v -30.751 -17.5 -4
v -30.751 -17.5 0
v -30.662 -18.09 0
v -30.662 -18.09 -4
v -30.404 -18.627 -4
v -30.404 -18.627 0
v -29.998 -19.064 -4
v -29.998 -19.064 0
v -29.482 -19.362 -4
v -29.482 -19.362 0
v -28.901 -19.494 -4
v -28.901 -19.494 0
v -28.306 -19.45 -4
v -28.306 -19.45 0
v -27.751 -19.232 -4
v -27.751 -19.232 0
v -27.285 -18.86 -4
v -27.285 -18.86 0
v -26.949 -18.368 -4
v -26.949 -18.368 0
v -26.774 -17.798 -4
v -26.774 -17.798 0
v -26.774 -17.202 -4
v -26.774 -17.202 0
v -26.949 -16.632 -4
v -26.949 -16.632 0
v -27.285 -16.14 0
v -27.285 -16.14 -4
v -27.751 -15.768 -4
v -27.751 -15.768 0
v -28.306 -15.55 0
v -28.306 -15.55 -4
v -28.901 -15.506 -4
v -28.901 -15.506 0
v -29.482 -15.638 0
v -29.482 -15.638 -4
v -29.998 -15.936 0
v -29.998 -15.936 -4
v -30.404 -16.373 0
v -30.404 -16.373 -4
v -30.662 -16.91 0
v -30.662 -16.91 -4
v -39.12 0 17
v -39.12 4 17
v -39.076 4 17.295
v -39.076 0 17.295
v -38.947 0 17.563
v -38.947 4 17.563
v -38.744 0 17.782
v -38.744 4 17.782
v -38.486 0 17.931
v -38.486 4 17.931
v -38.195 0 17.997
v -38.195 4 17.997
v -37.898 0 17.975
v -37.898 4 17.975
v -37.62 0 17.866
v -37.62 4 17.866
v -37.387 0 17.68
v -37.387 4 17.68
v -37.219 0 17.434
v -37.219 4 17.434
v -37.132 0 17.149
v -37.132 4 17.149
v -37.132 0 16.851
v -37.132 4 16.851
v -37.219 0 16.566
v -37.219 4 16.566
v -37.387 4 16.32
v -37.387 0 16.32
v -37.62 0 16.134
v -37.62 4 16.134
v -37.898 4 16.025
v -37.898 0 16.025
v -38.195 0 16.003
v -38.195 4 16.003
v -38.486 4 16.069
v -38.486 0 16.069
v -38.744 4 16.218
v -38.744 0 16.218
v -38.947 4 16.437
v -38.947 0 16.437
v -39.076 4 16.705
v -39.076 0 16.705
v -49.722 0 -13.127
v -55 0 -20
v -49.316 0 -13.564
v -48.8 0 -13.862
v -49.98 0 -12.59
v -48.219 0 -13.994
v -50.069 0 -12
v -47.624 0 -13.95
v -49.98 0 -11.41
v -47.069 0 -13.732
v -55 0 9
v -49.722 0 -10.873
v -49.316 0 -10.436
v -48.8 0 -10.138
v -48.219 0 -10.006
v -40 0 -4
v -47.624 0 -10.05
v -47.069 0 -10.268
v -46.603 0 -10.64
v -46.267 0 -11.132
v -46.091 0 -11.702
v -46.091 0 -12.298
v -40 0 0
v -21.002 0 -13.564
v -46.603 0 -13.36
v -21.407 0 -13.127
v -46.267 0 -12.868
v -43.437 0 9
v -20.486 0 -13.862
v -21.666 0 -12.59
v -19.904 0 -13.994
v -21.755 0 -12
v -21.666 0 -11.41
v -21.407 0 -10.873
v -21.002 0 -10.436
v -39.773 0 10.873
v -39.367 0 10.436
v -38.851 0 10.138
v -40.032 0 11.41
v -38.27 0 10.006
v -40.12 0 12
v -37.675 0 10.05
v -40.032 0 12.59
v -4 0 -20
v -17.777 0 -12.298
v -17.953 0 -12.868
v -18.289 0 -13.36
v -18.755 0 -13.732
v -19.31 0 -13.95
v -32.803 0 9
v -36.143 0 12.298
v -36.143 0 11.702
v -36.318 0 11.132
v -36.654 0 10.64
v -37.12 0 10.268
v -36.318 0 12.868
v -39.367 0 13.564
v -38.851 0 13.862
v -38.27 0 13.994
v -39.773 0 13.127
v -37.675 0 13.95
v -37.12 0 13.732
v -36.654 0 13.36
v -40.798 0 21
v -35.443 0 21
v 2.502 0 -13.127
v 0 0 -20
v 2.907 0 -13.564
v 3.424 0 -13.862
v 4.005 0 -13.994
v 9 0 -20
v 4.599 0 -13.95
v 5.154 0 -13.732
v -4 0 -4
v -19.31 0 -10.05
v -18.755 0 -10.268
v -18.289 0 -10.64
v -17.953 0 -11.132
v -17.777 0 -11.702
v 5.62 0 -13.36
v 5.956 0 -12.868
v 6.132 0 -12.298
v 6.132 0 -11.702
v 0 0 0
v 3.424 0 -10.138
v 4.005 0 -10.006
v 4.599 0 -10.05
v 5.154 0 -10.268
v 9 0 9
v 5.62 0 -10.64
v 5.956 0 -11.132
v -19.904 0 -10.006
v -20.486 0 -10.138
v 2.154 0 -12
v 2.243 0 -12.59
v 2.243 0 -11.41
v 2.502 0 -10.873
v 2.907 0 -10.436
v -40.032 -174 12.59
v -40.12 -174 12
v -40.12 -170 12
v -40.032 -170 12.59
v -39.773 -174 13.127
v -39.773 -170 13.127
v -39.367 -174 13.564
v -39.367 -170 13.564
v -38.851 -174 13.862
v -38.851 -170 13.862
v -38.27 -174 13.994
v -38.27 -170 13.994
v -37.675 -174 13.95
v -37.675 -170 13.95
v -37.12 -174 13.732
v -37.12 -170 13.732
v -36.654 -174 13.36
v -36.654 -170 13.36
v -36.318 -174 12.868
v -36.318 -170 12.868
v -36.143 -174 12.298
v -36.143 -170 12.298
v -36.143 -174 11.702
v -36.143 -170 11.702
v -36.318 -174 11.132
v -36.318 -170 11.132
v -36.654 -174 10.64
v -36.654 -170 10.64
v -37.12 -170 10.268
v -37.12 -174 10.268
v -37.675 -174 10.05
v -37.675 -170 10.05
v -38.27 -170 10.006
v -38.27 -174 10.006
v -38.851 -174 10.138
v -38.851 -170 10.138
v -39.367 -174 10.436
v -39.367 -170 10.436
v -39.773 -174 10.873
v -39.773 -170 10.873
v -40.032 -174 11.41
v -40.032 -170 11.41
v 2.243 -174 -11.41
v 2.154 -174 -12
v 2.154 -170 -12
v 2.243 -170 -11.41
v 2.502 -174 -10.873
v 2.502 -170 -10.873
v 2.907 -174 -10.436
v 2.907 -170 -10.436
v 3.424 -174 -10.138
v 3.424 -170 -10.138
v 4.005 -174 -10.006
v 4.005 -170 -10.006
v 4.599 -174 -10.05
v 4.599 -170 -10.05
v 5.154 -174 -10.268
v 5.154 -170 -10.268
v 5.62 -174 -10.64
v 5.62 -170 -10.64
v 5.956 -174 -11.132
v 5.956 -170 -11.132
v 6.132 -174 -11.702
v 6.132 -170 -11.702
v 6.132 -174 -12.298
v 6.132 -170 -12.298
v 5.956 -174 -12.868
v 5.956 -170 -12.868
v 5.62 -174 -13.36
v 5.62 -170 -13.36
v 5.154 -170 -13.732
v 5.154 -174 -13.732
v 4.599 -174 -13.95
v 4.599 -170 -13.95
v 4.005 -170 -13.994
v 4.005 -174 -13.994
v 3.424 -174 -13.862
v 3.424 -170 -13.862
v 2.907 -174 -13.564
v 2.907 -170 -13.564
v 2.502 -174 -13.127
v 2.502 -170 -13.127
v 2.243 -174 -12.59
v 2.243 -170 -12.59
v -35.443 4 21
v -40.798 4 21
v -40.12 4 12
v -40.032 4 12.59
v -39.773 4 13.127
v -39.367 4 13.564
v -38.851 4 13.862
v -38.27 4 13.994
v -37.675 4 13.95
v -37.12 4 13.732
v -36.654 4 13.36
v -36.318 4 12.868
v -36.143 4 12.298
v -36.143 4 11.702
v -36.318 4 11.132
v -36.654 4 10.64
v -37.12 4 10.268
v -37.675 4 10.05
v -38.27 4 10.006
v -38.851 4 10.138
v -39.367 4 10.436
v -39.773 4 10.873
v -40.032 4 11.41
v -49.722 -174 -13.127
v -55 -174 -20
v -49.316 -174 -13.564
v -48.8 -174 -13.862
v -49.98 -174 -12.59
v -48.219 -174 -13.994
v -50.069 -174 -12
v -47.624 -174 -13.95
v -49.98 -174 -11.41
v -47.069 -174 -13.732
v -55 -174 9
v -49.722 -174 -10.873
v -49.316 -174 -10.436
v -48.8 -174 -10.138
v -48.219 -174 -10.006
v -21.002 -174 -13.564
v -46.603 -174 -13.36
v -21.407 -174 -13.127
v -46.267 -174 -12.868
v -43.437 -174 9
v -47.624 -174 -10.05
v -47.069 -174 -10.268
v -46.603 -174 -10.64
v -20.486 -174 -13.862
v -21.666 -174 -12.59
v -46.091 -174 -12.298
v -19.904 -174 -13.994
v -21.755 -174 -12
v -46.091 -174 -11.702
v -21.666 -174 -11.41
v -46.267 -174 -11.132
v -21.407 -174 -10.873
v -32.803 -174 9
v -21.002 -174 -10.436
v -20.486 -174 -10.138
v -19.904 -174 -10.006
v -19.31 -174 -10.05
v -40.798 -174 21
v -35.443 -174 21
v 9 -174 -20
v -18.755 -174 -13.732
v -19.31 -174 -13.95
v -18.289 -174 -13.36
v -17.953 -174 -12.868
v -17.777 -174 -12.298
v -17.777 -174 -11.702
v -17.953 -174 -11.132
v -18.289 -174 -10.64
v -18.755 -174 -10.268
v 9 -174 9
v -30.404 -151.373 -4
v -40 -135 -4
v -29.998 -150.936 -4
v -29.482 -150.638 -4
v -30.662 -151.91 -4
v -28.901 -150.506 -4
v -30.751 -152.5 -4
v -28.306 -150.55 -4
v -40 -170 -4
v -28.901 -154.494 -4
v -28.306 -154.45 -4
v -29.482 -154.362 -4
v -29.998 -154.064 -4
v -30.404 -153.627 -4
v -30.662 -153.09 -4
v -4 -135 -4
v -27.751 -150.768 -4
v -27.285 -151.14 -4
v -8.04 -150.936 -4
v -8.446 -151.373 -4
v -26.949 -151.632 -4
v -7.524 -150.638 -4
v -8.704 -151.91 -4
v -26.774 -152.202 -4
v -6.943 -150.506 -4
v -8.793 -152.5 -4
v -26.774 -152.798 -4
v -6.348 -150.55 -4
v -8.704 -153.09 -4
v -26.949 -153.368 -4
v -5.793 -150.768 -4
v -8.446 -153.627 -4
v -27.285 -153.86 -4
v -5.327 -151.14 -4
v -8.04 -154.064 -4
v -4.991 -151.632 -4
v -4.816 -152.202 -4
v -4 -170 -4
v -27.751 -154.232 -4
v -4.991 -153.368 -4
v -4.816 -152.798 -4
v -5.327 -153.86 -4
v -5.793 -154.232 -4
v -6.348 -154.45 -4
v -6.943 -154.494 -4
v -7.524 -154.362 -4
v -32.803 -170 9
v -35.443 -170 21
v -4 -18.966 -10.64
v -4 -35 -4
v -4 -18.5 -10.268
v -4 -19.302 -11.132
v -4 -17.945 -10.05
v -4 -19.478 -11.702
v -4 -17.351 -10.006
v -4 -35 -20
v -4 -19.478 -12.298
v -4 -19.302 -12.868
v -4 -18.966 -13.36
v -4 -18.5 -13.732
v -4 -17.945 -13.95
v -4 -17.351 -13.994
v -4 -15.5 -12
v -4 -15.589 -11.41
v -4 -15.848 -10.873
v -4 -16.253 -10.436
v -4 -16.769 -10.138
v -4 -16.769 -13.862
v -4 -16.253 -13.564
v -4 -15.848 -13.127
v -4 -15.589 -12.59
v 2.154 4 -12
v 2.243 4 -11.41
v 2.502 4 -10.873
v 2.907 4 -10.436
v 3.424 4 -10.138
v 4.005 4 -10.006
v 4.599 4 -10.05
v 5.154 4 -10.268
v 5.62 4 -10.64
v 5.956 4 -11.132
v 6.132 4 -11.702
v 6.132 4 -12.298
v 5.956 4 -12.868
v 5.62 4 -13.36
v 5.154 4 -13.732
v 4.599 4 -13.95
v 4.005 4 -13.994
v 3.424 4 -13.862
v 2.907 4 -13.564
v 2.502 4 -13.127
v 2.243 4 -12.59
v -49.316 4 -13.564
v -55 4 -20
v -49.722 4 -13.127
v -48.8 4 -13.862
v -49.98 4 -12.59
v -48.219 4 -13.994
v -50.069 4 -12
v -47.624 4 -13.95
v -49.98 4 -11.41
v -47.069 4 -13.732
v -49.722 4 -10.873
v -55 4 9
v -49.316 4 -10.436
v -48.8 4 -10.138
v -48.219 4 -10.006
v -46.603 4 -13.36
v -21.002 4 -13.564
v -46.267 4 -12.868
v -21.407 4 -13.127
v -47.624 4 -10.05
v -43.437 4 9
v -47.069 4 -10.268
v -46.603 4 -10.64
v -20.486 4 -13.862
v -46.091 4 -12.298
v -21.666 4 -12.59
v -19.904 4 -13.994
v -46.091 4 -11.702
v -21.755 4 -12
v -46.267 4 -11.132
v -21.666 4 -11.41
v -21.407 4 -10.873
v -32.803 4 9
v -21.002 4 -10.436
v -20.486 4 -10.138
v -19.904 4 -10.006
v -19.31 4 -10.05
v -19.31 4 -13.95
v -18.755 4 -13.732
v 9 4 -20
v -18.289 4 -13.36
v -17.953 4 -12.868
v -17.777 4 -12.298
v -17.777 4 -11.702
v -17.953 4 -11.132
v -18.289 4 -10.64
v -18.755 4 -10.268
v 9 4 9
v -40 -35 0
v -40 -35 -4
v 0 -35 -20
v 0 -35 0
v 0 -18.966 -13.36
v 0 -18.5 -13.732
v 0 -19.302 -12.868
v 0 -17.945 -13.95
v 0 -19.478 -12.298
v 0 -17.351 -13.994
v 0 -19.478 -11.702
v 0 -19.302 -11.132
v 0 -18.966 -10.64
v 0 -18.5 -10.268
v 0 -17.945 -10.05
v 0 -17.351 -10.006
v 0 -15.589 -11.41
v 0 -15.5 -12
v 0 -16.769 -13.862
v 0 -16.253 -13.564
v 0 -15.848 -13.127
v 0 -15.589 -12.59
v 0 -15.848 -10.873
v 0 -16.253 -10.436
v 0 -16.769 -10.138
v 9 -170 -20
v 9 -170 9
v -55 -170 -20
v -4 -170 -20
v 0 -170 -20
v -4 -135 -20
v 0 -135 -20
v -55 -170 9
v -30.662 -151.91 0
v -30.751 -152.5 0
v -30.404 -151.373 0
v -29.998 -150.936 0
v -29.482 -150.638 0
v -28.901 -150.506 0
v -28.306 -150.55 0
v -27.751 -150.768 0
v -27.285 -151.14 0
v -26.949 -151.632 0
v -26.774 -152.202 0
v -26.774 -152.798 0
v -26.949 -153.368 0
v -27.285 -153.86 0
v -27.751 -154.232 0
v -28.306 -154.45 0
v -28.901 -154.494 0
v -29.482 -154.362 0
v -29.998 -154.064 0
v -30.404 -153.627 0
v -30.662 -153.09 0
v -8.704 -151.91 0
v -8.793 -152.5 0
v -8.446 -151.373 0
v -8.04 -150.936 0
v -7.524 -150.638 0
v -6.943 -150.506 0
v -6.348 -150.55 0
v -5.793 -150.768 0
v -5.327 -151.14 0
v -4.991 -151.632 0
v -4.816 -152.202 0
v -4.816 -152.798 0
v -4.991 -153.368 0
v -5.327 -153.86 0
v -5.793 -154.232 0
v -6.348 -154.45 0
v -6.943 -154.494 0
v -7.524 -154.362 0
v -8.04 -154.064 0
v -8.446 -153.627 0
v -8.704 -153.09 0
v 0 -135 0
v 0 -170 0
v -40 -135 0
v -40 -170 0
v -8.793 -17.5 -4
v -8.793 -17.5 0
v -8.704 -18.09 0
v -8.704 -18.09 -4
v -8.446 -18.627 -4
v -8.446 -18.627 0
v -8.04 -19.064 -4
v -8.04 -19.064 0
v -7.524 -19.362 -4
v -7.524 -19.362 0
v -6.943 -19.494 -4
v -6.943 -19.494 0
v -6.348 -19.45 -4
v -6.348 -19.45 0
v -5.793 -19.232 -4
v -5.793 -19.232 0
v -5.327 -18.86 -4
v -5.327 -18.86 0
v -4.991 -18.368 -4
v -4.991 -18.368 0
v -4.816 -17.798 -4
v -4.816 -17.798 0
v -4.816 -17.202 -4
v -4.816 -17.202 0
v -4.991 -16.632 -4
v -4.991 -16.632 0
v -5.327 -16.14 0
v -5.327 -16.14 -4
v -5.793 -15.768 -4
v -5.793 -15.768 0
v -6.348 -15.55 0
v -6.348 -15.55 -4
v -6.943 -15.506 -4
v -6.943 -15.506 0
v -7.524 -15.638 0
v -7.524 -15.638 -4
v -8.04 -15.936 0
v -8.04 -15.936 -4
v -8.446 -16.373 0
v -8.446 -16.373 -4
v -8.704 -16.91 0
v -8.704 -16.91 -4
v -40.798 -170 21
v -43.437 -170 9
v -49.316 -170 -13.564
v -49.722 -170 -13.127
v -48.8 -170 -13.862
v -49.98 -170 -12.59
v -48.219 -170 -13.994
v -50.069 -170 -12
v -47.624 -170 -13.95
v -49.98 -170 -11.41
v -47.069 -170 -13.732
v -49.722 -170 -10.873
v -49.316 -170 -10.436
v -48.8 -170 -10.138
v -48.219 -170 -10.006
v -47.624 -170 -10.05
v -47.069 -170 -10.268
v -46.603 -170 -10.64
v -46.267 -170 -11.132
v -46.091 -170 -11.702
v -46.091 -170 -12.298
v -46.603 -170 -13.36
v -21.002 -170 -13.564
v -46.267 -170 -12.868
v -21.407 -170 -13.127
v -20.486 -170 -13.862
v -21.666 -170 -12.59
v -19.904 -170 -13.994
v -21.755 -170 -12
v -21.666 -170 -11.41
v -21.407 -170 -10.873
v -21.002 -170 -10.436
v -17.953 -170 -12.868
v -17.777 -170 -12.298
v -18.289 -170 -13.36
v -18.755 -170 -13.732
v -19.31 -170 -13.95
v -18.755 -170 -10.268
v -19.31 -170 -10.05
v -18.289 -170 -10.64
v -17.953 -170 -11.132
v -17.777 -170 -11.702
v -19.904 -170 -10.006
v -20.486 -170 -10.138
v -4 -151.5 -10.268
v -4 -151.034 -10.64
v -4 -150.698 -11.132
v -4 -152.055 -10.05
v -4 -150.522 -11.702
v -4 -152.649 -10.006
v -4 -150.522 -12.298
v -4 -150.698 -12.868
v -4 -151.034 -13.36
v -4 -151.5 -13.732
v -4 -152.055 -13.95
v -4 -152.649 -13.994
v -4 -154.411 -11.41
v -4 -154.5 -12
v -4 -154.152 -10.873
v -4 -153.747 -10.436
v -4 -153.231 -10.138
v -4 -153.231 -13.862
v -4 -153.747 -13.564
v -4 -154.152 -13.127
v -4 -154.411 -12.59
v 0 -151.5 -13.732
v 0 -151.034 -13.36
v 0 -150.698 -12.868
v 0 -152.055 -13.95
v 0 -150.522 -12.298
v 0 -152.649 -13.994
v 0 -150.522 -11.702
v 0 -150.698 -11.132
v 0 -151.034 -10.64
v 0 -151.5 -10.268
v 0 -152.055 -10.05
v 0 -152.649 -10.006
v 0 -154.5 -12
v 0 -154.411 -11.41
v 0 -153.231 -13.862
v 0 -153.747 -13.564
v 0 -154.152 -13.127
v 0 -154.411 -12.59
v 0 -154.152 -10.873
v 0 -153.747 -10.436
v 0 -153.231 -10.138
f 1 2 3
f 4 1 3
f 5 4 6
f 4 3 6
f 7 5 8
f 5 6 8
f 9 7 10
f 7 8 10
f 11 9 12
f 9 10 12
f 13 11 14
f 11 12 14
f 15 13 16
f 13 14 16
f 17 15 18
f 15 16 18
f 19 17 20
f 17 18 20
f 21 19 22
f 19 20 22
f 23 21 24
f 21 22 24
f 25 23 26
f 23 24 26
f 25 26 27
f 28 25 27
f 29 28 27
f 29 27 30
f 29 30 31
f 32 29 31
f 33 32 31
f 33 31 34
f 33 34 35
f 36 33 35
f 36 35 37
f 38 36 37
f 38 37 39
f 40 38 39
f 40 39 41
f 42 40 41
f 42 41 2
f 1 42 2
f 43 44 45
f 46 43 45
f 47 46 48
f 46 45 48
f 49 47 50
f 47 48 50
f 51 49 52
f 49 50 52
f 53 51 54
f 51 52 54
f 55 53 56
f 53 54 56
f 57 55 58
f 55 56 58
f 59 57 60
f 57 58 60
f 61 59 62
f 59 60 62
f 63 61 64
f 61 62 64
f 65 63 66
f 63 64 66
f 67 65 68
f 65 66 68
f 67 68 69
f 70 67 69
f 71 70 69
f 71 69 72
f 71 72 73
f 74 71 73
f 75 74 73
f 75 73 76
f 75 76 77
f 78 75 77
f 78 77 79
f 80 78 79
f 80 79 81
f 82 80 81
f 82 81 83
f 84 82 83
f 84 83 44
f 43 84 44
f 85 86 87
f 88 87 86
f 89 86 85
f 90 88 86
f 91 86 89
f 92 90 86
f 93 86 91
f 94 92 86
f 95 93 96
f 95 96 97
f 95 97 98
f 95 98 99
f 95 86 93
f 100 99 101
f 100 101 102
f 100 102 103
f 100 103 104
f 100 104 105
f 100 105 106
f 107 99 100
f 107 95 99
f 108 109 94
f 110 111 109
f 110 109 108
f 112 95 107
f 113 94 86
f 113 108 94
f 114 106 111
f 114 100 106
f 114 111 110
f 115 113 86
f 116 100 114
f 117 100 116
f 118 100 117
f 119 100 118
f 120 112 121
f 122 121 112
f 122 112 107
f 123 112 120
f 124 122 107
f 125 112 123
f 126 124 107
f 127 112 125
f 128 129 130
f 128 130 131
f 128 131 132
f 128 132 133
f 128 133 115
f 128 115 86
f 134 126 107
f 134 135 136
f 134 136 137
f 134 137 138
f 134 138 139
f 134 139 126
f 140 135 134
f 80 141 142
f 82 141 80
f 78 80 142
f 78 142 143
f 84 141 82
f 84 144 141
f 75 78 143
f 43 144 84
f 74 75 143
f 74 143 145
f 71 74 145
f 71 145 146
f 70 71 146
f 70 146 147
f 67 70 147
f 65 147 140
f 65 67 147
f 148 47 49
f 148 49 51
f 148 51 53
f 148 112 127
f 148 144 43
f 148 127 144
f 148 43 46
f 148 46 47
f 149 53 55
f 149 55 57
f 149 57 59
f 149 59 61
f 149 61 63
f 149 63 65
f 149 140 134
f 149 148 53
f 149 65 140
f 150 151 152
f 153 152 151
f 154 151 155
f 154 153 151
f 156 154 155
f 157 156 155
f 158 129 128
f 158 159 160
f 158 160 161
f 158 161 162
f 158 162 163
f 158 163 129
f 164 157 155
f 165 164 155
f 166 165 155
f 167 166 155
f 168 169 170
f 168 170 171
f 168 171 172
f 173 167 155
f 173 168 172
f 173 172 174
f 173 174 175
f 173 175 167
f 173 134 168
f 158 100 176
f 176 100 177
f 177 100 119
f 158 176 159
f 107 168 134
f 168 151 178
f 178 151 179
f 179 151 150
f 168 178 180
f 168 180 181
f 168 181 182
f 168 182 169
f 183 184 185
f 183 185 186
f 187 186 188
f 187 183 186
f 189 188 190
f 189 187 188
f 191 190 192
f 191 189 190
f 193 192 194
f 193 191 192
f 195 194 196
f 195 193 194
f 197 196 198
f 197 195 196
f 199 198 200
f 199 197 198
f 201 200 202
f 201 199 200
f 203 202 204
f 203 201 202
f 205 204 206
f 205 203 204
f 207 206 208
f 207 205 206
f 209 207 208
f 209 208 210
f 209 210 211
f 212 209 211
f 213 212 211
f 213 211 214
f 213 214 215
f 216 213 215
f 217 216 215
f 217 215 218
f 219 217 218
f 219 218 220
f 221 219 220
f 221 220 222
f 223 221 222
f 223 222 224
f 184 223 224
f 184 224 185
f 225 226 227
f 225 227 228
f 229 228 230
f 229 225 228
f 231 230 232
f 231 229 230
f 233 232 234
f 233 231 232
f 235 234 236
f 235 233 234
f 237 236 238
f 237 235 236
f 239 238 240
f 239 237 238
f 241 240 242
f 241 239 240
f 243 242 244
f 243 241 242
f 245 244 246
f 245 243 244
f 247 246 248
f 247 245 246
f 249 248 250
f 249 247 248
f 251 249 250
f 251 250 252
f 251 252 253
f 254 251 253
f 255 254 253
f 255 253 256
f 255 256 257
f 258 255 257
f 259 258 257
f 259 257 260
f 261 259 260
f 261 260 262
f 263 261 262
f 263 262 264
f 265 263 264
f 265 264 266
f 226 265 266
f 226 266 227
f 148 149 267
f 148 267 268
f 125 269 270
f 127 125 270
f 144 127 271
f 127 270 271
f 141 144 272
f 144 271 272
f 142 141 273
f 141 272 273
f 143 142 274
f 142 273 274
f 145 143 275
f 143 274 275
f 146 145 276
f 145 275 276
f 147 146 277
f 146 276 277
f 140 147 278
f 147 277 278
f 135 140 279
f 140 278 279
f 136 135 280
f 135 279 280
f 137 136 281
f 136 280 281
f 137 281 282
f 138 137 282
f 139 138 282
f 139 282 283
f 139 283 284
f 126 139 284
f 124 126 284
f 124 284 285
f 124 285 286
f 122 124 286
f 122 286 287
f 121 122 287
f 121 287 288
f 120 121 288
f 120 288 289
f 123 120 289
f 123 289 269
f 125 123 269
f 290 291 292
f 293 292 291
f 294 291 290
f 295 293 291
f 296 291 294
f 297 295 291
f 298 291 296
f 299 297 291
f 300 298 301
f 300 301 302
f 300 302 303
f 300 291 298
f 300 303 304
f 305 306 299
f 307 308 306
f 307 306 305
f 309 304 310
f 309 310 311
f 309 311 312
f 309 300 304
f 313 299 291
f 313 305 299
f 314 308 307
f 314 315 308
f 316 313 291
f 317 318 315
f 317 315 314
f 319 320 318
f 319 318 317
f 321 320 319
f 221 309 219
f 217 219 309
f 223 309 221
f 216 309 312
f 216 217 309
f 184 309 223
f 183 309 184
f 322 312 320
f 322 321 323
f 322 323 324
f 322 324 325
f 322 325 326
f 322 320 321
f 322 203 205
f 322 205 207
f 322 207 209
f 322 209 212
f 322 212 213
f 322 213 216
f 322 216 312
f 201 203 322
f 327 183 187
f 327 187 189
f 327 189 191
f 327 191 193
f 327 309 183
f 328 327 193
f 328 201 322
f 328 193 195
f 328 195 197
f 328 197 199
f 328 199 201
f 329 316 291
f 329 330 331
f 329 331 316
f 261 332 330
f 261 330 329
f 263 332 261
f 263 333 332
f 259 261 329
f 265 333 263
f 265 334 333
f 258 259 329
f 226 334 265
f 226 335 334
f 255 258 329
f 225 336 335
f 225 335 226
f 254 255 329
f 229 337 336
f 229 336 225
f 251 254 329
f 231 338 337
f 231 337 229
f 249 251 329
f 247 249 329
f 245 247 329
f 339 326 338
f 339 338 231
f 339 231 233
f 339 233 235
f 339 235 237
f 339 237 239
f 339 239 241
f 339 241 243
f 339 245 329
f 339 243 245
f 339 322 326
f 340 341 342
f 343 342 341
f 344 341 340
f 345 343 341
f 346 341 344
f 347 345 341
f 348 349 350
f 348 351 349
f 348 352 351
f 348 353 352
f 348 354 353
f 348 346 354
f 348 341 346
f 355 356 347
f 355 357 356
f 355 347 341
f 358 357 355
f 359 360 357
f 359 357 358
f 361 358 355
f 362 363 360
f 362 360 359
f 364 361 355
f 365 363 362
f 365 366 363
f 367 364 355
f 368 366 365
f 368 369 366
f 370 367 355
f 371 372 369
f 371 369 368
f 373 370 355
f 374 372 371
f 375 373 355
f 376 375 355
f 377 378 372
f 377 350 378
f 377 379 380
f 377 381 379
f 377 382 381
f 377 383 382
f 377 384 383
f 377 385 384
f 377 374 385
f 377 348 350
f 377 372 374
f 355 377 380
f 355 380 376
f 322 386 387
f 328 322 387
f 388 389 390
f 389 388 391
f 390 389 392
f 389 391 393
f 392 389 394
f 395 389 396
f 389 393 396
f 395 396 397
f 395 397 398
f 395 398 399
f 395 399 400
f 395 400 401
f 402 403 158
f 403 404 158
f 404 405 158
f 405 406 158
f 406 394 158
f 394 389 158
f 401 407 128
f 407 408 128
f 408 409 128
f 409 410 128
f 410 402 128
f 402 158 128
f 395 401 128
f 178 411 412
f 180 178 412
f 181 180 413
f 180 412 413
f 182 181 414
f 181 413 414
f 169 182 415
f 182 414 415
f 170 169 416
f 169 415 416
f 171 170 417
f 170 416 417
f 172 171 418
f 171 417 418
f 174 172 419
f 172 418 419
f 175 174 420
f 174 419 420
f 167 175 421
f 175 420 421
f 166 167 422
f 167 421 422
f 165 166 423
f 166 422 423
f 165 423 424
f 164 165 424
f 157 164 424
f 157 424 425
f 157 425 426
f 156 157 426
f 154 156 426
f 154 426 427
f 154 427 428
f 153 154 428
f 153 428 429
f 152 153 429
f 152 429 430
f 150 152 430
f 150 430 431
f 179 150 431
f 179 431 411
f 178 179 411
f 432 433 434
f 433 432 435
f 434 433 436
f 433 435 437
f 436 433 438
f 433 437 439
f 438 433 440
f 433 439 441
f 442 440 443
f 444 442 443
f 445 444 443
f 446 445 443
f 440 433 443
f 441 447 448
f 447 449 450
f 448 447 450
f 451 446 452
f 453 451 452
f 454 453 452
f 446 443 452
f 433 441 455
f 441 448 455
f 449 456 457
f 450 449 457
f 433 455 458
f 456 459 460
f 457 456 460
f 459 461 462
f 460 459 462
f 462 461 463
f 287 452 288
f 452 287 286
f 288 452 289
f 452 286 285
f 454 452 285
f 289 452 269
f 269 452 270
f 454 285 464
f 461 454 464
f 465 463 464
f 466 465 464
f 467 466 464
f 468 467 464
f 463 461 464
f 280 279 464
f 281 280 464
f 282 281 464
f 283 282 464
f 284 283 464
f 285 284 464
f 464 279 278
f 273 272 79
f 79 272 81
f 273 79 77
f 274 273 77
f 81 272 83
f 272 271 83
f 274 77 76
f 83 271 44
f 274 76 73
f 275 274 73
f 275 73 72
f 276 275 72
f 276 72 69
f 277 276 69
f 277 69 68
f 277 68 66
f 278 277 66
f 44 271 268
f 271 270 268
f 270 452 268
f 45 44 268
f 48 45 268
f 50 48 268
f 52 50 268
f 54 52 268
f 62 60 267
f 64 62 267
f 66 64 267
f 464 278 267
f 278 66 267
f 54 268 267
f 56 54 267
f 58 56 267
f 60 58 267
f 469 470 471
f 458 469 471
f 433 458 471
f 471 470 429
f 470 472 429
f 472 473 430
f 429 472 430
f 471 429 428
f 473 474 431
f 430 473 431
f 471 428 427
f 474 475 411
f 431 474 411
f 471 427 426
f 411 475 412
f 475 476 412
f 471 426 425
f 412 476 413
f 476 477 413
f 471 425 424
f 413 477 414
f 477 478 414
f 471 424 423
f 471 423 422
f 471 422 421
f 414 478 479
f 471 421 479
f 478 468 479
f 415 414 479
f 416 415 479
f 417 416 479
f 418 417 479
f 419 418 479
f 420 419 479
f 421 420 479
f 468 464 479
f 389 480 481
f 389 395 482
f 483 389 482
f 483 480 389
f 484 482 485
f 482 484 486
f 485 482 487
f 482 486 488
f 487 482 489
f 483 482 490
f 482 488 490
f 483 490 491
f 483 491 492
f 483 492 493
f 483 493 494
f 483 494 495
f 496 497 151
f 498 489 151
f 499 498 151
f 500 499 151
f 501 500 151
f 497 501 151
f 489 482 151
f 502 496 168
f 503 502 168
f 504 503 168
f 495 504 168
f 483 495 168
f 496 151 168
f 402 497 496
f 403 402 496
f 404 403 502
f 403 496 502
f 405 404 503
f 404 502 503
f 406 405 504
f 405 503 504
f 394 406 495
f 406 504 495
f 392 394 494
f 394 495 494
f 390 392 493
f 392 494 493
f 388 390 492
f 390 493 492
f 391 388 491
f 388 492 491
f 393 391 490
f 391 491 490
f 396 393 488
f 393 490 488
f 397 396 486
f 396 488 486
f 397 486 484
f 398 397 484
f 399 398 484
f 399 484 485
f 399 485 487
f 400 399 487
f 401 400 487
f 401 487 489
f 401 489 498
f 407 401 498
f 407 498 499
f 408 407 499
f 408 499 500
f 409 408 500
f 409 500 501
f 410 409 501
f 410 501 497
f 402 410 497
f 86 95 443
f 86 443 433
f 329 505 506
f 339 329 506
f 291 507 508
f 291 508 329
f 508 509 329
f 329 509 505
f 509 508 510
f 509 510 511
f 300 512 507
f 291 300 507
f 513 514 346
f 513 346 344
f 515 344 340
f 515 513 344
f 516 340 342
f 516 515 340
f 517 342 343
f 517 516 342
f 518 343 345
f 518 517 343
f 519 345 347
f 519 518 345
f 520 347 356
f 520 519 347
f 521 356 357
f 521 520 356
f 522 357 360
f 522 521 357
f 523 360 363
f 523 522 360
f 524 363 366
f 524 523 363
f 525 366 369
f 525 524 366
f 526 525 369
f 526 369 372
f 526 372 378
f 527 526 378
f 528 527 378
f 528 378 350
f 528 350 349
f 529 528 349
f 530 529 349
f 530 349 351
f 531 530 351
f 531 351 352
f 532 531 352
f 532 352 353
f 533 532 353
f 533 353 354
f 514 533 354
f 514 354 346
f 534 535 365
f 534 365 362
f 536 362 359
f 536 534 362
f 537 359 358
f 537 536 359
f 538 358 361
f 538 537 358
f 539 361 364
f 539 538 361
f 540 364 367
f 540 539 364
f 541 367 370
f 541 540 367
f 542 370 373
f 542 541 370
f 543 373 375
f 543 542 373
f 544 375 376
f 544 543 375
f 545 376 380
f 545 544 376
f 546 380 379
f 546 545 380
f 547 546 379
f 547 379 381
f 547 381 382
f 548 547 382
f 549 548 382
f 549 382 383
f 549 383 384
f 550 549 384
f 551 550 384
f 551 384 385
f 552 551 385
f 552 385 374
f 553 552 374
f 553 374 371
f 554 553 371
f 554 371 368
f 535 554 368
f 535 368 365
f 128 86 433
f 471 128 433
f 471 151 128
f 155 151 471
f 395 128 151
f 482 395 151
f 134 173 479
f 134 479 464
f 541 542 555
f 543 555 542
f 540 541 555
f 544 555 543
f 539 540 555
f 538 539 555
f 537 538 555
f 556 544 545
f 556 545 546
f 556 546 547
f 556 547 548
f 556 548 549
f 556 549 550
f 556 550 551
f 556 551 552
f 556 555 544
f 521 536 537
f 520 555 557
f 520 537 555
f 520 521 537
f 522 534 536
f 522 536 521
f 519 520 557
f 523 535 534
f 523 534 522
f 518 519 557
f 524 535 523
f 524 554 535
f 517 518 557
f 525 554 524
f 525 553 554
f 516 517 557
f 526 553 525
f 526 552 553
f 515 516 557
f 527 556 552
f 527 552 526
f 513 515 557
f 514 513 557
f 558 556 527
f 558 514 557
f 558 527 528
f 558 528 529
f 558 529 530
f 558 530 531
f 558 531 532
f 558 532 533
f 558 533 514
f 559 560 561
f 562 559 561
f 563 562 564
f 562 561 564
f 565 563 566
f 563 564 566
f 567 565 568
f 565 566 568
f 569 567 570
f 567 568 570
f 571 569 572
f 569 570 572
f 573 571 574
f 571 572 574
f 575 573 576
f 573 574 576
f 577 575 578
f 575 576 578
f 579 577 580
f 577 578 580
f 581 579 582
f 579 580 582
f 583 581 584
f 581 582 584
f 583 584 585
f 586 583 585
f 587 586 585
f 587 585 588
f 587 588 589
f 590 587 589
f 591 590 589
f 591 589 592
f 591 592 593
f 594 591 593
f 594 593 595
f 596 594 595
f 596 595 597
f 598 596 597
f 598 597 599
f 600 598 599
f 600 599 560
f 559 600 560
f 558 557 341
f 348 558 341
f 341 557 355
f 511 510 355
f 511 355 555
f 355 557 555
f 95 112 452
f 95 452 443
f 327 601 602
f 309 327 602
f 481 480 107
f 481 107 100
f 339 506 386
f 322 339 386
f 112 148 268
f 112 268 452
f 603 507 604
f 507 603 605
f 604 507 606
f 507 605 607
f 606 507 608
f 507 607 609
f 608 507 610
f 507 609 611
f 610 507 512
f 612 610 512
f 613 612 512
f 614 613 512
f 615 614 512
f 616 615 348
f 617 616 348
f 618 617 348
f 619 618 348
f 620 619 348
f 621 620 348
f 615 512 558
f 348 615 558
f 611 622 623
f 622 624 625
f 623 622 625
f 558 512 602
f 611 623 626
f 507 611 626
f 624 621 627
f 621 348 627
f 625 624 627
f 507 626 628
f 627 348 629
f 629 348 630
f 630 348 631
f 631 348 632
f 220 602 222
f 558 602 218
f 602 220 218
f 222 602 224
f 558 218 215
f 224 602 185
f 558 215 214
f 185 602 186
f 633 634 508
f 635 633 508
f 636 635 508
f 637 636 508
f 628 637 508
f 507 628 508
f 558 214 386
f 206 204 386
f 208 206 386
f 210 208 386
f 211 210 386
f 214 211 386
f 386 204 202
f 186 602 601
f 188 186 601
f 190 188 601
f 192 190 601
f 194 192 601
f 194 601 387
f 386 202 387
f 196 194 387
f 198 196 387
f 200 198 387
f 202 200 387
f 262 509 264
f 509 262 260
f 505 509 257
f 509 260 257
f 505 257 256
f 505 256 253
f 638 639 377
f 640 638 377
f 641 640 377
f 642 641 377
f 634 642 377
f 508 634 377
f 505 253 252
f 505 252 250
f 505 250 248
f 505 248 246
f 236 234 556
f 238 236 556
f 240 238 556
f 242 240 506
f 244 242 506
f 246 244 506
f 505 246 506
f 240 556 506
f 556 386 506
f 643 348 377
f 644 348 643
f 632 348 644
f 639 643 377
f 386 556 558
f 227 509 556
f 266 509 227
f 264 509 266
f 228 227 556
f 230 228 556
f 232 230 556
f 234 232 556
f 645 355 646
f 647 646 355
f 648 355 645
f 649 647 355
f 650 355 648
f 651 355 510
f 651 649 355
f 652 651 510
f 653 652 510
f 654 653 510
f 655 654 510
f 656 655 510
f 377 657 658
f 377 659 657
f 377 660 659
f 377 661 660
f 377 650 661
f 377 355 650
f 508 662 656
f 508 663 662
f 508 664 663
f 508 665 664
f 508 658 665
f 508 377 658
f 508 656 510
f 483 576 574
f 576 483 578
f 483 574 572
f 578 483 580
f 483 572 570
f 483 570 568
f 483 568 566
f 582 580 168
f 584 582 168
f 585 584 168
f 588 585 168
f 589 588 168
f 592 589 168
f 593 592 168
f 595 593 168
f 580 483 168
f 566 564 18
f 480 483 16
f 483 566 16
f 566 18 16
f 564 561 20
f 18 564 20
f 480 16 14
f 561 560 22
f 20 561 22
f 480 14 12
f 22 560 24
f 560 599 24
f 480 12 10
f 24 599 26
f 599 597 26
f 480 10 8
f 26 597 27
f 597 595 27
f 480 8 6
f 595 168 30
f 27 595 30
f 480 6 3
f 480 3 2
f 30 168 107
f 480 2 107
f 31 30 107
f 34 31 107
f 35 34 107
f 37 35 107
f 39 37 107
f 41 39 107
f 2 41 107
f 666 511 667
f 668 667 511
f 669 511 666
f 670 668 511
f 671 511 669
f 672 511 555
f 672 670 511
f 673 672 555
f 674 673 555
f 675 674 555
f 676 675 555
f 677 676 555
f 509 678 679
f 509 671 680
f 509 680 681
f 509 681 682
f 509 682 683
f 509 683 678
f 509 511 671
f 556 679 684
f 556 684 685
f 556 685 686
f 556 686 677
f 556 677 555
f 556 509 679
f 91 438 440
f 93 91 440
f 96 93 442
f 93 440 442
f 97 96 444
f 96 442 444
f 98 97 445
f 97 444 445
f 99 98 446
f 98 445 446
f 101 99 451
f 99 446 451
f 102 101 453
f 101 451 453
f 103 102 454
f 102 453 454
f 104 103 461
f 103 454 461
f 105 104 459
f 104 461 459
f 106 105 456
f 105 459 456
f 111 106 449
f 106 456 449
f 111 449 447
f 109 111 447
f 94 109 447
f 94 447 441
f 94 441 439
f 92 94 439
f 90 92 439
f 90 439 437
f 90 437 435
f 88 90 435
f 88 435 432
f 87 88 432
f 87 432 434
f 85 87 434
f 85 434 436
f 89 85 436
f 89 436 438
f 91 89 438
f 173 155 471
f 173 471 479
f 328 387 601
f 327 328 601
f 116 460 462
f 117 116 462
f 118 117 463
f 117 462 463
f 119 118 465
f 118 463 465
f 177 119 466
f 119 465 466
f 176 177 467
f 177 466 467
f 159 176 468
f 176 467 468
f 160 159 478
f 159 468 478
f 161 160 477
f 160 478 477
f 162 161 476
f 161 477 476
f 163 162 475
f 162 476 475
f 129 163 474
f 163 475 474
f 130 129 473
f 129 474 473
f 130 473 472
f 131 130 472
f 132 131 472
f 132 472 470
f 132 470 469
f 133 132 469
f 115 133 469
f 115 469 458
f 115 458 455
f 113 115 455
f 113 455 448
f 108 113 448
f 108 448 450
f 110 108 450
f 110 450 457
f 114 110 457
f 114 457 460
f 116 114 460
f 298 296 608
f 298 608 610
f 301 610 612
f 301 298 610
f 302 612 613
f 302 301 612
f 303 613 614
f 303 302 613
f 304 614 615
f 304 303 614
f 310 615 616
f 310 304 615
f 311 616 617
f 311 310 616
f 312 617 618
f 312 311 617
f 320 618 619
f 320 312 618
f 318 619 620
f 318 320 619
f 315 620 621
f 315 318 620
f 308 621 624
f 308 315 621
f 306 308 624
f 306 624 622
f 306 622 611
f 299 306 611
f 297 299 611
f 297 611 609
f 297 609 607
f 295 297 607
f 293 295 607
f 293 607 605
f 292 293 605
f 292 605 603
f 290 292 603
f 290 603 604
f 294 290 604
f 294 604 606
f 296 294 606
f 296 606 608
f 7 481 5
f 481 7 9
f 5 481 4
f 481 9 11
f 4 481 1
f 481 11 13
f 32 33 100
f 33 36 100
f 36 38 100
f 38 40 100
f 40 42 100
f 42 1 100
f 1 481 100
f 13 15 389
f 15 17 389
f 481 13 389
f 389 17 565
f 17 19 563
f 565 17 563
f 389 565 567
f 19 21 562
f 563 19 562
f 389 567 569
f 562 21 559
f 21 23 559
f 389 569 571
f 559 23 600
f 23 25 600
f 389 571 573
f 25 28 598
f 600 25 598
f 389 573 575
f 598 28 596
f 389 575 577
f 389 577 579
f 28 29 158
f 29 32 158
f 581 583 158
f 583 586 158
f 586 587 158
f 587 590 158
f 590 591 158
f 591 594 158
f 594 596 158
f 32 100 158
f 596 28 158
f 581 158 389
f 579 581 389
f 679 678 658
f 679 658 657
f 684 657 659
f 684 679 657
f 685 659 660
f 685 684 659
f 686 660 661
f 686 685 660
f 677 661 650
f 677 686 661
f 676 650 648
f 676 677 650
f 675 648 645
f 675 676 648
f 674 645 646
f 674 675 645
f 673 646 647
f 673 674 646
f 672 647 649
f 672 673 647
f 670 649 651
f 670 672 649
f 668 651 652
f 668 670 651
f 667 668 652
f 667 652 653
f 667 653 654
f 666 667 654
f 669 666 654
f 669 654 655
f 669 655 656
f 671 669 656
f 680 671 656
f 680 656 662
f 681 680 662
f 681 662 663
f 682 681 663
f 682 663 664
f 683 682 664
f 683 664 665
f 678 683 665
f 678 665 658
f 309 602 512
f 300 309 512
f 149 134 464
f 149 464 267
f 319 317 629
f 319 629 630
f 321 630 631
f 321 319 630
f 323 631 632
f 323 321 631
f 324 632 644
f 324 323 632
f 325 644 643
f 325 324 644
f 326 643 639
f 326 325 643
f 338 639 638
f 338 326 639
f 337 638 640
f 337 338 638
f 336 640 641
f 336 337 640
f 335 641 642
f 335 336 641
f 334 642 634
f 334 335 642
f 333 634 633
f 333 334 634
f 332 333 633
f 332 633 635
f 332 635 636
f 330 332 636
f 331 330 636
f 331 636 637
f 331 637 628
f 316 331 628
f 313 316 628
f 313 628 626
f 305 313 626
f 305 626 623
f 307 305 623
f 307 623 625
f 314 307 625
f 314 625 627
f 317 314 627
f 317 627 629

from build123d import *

# Parameters (mm, degrees)
F2_DEPTH   = 4
F4_DEPTH   = 35
F7_D       = 4
F7_ON_F6_D = 4
F7_ON_F5_D = 4
F11_D      = 2


with BuildPart() as f2:
    # F1 (on Front) → F2 (new body)
    with BuildSketch(Plane.XZ):
        Polygon((-40, 0), (0, 0), (0, -20), (9, -20), (9, 9), (-32.8034572303, 9), (-43.4373132885, 9), (-55, 9), (-55, 0), (-55, -20), (-4, -20), (-4, -4), (-40, -4), align=None)
        Polygon((0, -20), (0, 0), (-40, 0), (-40, -4), (-4, -4), (-4, -20), align=None)
        Polygon((-43.4373132885, 9), (-32.8034572303, 9), (-35.4425162077, 21), (-40.7982543111, 21), align=None)
    extrude(amount=-F2_DEPTH)

    # F1 (on Front) → F4 (join)
    with BuildSketch(Plane.XZ):
        Polygon((0, -20), (0, 0), (-40, 0), (-40, -4), (-4, -4), (-4, -20), align=None)
    extrude(amount=F4_DEPTH)

    # F7 (through all)
    with Locations(Plane.XZ):
        with Locations((-48.0690838993, -12), (-19.7549181283, -12), (4.1542227156, -12), (-38.1203852594, 12)):
            Hole(F7_D / 2)

    # F7 on F6 (through all)
    with Locations(Plane(origin=(-4, 0, 0), x_dir=(0, -1, 0), z_dir=(-1, 0, 0))):
        with Locations((17.5, -12)):
            Hole(F7_ON_F6_D / 2)

    # F7 on F5 (through all)
    with Locations(Plane(origin=(0, 0, -4), x_dir=(1, 0, 0), z_dir=(0, 0, -1))):
        with Locations((-6.7932120338, 17.5), (-28.7511822581, 17.5)):
            Hole(F7_ON_F5_D / 2)


with BuildPart() as f10_1:
    # F10: instance of F2
    add(f2.part.mirror(Plane(origin=(-14.8571428571, -85, -4.8571428571), x_dir=(1, 0, 0), z_dir=(0, -1, 0))))


with BuildPart() as f2_1:
    add(f2.part)

    # F11 (through all)
    with Locations(Plane.XZ):
        with Locations((-38.1203852594, 17)):
            Hole(F11_D / 2)


solid = Compound([f10_1.part, f2_1.part])
